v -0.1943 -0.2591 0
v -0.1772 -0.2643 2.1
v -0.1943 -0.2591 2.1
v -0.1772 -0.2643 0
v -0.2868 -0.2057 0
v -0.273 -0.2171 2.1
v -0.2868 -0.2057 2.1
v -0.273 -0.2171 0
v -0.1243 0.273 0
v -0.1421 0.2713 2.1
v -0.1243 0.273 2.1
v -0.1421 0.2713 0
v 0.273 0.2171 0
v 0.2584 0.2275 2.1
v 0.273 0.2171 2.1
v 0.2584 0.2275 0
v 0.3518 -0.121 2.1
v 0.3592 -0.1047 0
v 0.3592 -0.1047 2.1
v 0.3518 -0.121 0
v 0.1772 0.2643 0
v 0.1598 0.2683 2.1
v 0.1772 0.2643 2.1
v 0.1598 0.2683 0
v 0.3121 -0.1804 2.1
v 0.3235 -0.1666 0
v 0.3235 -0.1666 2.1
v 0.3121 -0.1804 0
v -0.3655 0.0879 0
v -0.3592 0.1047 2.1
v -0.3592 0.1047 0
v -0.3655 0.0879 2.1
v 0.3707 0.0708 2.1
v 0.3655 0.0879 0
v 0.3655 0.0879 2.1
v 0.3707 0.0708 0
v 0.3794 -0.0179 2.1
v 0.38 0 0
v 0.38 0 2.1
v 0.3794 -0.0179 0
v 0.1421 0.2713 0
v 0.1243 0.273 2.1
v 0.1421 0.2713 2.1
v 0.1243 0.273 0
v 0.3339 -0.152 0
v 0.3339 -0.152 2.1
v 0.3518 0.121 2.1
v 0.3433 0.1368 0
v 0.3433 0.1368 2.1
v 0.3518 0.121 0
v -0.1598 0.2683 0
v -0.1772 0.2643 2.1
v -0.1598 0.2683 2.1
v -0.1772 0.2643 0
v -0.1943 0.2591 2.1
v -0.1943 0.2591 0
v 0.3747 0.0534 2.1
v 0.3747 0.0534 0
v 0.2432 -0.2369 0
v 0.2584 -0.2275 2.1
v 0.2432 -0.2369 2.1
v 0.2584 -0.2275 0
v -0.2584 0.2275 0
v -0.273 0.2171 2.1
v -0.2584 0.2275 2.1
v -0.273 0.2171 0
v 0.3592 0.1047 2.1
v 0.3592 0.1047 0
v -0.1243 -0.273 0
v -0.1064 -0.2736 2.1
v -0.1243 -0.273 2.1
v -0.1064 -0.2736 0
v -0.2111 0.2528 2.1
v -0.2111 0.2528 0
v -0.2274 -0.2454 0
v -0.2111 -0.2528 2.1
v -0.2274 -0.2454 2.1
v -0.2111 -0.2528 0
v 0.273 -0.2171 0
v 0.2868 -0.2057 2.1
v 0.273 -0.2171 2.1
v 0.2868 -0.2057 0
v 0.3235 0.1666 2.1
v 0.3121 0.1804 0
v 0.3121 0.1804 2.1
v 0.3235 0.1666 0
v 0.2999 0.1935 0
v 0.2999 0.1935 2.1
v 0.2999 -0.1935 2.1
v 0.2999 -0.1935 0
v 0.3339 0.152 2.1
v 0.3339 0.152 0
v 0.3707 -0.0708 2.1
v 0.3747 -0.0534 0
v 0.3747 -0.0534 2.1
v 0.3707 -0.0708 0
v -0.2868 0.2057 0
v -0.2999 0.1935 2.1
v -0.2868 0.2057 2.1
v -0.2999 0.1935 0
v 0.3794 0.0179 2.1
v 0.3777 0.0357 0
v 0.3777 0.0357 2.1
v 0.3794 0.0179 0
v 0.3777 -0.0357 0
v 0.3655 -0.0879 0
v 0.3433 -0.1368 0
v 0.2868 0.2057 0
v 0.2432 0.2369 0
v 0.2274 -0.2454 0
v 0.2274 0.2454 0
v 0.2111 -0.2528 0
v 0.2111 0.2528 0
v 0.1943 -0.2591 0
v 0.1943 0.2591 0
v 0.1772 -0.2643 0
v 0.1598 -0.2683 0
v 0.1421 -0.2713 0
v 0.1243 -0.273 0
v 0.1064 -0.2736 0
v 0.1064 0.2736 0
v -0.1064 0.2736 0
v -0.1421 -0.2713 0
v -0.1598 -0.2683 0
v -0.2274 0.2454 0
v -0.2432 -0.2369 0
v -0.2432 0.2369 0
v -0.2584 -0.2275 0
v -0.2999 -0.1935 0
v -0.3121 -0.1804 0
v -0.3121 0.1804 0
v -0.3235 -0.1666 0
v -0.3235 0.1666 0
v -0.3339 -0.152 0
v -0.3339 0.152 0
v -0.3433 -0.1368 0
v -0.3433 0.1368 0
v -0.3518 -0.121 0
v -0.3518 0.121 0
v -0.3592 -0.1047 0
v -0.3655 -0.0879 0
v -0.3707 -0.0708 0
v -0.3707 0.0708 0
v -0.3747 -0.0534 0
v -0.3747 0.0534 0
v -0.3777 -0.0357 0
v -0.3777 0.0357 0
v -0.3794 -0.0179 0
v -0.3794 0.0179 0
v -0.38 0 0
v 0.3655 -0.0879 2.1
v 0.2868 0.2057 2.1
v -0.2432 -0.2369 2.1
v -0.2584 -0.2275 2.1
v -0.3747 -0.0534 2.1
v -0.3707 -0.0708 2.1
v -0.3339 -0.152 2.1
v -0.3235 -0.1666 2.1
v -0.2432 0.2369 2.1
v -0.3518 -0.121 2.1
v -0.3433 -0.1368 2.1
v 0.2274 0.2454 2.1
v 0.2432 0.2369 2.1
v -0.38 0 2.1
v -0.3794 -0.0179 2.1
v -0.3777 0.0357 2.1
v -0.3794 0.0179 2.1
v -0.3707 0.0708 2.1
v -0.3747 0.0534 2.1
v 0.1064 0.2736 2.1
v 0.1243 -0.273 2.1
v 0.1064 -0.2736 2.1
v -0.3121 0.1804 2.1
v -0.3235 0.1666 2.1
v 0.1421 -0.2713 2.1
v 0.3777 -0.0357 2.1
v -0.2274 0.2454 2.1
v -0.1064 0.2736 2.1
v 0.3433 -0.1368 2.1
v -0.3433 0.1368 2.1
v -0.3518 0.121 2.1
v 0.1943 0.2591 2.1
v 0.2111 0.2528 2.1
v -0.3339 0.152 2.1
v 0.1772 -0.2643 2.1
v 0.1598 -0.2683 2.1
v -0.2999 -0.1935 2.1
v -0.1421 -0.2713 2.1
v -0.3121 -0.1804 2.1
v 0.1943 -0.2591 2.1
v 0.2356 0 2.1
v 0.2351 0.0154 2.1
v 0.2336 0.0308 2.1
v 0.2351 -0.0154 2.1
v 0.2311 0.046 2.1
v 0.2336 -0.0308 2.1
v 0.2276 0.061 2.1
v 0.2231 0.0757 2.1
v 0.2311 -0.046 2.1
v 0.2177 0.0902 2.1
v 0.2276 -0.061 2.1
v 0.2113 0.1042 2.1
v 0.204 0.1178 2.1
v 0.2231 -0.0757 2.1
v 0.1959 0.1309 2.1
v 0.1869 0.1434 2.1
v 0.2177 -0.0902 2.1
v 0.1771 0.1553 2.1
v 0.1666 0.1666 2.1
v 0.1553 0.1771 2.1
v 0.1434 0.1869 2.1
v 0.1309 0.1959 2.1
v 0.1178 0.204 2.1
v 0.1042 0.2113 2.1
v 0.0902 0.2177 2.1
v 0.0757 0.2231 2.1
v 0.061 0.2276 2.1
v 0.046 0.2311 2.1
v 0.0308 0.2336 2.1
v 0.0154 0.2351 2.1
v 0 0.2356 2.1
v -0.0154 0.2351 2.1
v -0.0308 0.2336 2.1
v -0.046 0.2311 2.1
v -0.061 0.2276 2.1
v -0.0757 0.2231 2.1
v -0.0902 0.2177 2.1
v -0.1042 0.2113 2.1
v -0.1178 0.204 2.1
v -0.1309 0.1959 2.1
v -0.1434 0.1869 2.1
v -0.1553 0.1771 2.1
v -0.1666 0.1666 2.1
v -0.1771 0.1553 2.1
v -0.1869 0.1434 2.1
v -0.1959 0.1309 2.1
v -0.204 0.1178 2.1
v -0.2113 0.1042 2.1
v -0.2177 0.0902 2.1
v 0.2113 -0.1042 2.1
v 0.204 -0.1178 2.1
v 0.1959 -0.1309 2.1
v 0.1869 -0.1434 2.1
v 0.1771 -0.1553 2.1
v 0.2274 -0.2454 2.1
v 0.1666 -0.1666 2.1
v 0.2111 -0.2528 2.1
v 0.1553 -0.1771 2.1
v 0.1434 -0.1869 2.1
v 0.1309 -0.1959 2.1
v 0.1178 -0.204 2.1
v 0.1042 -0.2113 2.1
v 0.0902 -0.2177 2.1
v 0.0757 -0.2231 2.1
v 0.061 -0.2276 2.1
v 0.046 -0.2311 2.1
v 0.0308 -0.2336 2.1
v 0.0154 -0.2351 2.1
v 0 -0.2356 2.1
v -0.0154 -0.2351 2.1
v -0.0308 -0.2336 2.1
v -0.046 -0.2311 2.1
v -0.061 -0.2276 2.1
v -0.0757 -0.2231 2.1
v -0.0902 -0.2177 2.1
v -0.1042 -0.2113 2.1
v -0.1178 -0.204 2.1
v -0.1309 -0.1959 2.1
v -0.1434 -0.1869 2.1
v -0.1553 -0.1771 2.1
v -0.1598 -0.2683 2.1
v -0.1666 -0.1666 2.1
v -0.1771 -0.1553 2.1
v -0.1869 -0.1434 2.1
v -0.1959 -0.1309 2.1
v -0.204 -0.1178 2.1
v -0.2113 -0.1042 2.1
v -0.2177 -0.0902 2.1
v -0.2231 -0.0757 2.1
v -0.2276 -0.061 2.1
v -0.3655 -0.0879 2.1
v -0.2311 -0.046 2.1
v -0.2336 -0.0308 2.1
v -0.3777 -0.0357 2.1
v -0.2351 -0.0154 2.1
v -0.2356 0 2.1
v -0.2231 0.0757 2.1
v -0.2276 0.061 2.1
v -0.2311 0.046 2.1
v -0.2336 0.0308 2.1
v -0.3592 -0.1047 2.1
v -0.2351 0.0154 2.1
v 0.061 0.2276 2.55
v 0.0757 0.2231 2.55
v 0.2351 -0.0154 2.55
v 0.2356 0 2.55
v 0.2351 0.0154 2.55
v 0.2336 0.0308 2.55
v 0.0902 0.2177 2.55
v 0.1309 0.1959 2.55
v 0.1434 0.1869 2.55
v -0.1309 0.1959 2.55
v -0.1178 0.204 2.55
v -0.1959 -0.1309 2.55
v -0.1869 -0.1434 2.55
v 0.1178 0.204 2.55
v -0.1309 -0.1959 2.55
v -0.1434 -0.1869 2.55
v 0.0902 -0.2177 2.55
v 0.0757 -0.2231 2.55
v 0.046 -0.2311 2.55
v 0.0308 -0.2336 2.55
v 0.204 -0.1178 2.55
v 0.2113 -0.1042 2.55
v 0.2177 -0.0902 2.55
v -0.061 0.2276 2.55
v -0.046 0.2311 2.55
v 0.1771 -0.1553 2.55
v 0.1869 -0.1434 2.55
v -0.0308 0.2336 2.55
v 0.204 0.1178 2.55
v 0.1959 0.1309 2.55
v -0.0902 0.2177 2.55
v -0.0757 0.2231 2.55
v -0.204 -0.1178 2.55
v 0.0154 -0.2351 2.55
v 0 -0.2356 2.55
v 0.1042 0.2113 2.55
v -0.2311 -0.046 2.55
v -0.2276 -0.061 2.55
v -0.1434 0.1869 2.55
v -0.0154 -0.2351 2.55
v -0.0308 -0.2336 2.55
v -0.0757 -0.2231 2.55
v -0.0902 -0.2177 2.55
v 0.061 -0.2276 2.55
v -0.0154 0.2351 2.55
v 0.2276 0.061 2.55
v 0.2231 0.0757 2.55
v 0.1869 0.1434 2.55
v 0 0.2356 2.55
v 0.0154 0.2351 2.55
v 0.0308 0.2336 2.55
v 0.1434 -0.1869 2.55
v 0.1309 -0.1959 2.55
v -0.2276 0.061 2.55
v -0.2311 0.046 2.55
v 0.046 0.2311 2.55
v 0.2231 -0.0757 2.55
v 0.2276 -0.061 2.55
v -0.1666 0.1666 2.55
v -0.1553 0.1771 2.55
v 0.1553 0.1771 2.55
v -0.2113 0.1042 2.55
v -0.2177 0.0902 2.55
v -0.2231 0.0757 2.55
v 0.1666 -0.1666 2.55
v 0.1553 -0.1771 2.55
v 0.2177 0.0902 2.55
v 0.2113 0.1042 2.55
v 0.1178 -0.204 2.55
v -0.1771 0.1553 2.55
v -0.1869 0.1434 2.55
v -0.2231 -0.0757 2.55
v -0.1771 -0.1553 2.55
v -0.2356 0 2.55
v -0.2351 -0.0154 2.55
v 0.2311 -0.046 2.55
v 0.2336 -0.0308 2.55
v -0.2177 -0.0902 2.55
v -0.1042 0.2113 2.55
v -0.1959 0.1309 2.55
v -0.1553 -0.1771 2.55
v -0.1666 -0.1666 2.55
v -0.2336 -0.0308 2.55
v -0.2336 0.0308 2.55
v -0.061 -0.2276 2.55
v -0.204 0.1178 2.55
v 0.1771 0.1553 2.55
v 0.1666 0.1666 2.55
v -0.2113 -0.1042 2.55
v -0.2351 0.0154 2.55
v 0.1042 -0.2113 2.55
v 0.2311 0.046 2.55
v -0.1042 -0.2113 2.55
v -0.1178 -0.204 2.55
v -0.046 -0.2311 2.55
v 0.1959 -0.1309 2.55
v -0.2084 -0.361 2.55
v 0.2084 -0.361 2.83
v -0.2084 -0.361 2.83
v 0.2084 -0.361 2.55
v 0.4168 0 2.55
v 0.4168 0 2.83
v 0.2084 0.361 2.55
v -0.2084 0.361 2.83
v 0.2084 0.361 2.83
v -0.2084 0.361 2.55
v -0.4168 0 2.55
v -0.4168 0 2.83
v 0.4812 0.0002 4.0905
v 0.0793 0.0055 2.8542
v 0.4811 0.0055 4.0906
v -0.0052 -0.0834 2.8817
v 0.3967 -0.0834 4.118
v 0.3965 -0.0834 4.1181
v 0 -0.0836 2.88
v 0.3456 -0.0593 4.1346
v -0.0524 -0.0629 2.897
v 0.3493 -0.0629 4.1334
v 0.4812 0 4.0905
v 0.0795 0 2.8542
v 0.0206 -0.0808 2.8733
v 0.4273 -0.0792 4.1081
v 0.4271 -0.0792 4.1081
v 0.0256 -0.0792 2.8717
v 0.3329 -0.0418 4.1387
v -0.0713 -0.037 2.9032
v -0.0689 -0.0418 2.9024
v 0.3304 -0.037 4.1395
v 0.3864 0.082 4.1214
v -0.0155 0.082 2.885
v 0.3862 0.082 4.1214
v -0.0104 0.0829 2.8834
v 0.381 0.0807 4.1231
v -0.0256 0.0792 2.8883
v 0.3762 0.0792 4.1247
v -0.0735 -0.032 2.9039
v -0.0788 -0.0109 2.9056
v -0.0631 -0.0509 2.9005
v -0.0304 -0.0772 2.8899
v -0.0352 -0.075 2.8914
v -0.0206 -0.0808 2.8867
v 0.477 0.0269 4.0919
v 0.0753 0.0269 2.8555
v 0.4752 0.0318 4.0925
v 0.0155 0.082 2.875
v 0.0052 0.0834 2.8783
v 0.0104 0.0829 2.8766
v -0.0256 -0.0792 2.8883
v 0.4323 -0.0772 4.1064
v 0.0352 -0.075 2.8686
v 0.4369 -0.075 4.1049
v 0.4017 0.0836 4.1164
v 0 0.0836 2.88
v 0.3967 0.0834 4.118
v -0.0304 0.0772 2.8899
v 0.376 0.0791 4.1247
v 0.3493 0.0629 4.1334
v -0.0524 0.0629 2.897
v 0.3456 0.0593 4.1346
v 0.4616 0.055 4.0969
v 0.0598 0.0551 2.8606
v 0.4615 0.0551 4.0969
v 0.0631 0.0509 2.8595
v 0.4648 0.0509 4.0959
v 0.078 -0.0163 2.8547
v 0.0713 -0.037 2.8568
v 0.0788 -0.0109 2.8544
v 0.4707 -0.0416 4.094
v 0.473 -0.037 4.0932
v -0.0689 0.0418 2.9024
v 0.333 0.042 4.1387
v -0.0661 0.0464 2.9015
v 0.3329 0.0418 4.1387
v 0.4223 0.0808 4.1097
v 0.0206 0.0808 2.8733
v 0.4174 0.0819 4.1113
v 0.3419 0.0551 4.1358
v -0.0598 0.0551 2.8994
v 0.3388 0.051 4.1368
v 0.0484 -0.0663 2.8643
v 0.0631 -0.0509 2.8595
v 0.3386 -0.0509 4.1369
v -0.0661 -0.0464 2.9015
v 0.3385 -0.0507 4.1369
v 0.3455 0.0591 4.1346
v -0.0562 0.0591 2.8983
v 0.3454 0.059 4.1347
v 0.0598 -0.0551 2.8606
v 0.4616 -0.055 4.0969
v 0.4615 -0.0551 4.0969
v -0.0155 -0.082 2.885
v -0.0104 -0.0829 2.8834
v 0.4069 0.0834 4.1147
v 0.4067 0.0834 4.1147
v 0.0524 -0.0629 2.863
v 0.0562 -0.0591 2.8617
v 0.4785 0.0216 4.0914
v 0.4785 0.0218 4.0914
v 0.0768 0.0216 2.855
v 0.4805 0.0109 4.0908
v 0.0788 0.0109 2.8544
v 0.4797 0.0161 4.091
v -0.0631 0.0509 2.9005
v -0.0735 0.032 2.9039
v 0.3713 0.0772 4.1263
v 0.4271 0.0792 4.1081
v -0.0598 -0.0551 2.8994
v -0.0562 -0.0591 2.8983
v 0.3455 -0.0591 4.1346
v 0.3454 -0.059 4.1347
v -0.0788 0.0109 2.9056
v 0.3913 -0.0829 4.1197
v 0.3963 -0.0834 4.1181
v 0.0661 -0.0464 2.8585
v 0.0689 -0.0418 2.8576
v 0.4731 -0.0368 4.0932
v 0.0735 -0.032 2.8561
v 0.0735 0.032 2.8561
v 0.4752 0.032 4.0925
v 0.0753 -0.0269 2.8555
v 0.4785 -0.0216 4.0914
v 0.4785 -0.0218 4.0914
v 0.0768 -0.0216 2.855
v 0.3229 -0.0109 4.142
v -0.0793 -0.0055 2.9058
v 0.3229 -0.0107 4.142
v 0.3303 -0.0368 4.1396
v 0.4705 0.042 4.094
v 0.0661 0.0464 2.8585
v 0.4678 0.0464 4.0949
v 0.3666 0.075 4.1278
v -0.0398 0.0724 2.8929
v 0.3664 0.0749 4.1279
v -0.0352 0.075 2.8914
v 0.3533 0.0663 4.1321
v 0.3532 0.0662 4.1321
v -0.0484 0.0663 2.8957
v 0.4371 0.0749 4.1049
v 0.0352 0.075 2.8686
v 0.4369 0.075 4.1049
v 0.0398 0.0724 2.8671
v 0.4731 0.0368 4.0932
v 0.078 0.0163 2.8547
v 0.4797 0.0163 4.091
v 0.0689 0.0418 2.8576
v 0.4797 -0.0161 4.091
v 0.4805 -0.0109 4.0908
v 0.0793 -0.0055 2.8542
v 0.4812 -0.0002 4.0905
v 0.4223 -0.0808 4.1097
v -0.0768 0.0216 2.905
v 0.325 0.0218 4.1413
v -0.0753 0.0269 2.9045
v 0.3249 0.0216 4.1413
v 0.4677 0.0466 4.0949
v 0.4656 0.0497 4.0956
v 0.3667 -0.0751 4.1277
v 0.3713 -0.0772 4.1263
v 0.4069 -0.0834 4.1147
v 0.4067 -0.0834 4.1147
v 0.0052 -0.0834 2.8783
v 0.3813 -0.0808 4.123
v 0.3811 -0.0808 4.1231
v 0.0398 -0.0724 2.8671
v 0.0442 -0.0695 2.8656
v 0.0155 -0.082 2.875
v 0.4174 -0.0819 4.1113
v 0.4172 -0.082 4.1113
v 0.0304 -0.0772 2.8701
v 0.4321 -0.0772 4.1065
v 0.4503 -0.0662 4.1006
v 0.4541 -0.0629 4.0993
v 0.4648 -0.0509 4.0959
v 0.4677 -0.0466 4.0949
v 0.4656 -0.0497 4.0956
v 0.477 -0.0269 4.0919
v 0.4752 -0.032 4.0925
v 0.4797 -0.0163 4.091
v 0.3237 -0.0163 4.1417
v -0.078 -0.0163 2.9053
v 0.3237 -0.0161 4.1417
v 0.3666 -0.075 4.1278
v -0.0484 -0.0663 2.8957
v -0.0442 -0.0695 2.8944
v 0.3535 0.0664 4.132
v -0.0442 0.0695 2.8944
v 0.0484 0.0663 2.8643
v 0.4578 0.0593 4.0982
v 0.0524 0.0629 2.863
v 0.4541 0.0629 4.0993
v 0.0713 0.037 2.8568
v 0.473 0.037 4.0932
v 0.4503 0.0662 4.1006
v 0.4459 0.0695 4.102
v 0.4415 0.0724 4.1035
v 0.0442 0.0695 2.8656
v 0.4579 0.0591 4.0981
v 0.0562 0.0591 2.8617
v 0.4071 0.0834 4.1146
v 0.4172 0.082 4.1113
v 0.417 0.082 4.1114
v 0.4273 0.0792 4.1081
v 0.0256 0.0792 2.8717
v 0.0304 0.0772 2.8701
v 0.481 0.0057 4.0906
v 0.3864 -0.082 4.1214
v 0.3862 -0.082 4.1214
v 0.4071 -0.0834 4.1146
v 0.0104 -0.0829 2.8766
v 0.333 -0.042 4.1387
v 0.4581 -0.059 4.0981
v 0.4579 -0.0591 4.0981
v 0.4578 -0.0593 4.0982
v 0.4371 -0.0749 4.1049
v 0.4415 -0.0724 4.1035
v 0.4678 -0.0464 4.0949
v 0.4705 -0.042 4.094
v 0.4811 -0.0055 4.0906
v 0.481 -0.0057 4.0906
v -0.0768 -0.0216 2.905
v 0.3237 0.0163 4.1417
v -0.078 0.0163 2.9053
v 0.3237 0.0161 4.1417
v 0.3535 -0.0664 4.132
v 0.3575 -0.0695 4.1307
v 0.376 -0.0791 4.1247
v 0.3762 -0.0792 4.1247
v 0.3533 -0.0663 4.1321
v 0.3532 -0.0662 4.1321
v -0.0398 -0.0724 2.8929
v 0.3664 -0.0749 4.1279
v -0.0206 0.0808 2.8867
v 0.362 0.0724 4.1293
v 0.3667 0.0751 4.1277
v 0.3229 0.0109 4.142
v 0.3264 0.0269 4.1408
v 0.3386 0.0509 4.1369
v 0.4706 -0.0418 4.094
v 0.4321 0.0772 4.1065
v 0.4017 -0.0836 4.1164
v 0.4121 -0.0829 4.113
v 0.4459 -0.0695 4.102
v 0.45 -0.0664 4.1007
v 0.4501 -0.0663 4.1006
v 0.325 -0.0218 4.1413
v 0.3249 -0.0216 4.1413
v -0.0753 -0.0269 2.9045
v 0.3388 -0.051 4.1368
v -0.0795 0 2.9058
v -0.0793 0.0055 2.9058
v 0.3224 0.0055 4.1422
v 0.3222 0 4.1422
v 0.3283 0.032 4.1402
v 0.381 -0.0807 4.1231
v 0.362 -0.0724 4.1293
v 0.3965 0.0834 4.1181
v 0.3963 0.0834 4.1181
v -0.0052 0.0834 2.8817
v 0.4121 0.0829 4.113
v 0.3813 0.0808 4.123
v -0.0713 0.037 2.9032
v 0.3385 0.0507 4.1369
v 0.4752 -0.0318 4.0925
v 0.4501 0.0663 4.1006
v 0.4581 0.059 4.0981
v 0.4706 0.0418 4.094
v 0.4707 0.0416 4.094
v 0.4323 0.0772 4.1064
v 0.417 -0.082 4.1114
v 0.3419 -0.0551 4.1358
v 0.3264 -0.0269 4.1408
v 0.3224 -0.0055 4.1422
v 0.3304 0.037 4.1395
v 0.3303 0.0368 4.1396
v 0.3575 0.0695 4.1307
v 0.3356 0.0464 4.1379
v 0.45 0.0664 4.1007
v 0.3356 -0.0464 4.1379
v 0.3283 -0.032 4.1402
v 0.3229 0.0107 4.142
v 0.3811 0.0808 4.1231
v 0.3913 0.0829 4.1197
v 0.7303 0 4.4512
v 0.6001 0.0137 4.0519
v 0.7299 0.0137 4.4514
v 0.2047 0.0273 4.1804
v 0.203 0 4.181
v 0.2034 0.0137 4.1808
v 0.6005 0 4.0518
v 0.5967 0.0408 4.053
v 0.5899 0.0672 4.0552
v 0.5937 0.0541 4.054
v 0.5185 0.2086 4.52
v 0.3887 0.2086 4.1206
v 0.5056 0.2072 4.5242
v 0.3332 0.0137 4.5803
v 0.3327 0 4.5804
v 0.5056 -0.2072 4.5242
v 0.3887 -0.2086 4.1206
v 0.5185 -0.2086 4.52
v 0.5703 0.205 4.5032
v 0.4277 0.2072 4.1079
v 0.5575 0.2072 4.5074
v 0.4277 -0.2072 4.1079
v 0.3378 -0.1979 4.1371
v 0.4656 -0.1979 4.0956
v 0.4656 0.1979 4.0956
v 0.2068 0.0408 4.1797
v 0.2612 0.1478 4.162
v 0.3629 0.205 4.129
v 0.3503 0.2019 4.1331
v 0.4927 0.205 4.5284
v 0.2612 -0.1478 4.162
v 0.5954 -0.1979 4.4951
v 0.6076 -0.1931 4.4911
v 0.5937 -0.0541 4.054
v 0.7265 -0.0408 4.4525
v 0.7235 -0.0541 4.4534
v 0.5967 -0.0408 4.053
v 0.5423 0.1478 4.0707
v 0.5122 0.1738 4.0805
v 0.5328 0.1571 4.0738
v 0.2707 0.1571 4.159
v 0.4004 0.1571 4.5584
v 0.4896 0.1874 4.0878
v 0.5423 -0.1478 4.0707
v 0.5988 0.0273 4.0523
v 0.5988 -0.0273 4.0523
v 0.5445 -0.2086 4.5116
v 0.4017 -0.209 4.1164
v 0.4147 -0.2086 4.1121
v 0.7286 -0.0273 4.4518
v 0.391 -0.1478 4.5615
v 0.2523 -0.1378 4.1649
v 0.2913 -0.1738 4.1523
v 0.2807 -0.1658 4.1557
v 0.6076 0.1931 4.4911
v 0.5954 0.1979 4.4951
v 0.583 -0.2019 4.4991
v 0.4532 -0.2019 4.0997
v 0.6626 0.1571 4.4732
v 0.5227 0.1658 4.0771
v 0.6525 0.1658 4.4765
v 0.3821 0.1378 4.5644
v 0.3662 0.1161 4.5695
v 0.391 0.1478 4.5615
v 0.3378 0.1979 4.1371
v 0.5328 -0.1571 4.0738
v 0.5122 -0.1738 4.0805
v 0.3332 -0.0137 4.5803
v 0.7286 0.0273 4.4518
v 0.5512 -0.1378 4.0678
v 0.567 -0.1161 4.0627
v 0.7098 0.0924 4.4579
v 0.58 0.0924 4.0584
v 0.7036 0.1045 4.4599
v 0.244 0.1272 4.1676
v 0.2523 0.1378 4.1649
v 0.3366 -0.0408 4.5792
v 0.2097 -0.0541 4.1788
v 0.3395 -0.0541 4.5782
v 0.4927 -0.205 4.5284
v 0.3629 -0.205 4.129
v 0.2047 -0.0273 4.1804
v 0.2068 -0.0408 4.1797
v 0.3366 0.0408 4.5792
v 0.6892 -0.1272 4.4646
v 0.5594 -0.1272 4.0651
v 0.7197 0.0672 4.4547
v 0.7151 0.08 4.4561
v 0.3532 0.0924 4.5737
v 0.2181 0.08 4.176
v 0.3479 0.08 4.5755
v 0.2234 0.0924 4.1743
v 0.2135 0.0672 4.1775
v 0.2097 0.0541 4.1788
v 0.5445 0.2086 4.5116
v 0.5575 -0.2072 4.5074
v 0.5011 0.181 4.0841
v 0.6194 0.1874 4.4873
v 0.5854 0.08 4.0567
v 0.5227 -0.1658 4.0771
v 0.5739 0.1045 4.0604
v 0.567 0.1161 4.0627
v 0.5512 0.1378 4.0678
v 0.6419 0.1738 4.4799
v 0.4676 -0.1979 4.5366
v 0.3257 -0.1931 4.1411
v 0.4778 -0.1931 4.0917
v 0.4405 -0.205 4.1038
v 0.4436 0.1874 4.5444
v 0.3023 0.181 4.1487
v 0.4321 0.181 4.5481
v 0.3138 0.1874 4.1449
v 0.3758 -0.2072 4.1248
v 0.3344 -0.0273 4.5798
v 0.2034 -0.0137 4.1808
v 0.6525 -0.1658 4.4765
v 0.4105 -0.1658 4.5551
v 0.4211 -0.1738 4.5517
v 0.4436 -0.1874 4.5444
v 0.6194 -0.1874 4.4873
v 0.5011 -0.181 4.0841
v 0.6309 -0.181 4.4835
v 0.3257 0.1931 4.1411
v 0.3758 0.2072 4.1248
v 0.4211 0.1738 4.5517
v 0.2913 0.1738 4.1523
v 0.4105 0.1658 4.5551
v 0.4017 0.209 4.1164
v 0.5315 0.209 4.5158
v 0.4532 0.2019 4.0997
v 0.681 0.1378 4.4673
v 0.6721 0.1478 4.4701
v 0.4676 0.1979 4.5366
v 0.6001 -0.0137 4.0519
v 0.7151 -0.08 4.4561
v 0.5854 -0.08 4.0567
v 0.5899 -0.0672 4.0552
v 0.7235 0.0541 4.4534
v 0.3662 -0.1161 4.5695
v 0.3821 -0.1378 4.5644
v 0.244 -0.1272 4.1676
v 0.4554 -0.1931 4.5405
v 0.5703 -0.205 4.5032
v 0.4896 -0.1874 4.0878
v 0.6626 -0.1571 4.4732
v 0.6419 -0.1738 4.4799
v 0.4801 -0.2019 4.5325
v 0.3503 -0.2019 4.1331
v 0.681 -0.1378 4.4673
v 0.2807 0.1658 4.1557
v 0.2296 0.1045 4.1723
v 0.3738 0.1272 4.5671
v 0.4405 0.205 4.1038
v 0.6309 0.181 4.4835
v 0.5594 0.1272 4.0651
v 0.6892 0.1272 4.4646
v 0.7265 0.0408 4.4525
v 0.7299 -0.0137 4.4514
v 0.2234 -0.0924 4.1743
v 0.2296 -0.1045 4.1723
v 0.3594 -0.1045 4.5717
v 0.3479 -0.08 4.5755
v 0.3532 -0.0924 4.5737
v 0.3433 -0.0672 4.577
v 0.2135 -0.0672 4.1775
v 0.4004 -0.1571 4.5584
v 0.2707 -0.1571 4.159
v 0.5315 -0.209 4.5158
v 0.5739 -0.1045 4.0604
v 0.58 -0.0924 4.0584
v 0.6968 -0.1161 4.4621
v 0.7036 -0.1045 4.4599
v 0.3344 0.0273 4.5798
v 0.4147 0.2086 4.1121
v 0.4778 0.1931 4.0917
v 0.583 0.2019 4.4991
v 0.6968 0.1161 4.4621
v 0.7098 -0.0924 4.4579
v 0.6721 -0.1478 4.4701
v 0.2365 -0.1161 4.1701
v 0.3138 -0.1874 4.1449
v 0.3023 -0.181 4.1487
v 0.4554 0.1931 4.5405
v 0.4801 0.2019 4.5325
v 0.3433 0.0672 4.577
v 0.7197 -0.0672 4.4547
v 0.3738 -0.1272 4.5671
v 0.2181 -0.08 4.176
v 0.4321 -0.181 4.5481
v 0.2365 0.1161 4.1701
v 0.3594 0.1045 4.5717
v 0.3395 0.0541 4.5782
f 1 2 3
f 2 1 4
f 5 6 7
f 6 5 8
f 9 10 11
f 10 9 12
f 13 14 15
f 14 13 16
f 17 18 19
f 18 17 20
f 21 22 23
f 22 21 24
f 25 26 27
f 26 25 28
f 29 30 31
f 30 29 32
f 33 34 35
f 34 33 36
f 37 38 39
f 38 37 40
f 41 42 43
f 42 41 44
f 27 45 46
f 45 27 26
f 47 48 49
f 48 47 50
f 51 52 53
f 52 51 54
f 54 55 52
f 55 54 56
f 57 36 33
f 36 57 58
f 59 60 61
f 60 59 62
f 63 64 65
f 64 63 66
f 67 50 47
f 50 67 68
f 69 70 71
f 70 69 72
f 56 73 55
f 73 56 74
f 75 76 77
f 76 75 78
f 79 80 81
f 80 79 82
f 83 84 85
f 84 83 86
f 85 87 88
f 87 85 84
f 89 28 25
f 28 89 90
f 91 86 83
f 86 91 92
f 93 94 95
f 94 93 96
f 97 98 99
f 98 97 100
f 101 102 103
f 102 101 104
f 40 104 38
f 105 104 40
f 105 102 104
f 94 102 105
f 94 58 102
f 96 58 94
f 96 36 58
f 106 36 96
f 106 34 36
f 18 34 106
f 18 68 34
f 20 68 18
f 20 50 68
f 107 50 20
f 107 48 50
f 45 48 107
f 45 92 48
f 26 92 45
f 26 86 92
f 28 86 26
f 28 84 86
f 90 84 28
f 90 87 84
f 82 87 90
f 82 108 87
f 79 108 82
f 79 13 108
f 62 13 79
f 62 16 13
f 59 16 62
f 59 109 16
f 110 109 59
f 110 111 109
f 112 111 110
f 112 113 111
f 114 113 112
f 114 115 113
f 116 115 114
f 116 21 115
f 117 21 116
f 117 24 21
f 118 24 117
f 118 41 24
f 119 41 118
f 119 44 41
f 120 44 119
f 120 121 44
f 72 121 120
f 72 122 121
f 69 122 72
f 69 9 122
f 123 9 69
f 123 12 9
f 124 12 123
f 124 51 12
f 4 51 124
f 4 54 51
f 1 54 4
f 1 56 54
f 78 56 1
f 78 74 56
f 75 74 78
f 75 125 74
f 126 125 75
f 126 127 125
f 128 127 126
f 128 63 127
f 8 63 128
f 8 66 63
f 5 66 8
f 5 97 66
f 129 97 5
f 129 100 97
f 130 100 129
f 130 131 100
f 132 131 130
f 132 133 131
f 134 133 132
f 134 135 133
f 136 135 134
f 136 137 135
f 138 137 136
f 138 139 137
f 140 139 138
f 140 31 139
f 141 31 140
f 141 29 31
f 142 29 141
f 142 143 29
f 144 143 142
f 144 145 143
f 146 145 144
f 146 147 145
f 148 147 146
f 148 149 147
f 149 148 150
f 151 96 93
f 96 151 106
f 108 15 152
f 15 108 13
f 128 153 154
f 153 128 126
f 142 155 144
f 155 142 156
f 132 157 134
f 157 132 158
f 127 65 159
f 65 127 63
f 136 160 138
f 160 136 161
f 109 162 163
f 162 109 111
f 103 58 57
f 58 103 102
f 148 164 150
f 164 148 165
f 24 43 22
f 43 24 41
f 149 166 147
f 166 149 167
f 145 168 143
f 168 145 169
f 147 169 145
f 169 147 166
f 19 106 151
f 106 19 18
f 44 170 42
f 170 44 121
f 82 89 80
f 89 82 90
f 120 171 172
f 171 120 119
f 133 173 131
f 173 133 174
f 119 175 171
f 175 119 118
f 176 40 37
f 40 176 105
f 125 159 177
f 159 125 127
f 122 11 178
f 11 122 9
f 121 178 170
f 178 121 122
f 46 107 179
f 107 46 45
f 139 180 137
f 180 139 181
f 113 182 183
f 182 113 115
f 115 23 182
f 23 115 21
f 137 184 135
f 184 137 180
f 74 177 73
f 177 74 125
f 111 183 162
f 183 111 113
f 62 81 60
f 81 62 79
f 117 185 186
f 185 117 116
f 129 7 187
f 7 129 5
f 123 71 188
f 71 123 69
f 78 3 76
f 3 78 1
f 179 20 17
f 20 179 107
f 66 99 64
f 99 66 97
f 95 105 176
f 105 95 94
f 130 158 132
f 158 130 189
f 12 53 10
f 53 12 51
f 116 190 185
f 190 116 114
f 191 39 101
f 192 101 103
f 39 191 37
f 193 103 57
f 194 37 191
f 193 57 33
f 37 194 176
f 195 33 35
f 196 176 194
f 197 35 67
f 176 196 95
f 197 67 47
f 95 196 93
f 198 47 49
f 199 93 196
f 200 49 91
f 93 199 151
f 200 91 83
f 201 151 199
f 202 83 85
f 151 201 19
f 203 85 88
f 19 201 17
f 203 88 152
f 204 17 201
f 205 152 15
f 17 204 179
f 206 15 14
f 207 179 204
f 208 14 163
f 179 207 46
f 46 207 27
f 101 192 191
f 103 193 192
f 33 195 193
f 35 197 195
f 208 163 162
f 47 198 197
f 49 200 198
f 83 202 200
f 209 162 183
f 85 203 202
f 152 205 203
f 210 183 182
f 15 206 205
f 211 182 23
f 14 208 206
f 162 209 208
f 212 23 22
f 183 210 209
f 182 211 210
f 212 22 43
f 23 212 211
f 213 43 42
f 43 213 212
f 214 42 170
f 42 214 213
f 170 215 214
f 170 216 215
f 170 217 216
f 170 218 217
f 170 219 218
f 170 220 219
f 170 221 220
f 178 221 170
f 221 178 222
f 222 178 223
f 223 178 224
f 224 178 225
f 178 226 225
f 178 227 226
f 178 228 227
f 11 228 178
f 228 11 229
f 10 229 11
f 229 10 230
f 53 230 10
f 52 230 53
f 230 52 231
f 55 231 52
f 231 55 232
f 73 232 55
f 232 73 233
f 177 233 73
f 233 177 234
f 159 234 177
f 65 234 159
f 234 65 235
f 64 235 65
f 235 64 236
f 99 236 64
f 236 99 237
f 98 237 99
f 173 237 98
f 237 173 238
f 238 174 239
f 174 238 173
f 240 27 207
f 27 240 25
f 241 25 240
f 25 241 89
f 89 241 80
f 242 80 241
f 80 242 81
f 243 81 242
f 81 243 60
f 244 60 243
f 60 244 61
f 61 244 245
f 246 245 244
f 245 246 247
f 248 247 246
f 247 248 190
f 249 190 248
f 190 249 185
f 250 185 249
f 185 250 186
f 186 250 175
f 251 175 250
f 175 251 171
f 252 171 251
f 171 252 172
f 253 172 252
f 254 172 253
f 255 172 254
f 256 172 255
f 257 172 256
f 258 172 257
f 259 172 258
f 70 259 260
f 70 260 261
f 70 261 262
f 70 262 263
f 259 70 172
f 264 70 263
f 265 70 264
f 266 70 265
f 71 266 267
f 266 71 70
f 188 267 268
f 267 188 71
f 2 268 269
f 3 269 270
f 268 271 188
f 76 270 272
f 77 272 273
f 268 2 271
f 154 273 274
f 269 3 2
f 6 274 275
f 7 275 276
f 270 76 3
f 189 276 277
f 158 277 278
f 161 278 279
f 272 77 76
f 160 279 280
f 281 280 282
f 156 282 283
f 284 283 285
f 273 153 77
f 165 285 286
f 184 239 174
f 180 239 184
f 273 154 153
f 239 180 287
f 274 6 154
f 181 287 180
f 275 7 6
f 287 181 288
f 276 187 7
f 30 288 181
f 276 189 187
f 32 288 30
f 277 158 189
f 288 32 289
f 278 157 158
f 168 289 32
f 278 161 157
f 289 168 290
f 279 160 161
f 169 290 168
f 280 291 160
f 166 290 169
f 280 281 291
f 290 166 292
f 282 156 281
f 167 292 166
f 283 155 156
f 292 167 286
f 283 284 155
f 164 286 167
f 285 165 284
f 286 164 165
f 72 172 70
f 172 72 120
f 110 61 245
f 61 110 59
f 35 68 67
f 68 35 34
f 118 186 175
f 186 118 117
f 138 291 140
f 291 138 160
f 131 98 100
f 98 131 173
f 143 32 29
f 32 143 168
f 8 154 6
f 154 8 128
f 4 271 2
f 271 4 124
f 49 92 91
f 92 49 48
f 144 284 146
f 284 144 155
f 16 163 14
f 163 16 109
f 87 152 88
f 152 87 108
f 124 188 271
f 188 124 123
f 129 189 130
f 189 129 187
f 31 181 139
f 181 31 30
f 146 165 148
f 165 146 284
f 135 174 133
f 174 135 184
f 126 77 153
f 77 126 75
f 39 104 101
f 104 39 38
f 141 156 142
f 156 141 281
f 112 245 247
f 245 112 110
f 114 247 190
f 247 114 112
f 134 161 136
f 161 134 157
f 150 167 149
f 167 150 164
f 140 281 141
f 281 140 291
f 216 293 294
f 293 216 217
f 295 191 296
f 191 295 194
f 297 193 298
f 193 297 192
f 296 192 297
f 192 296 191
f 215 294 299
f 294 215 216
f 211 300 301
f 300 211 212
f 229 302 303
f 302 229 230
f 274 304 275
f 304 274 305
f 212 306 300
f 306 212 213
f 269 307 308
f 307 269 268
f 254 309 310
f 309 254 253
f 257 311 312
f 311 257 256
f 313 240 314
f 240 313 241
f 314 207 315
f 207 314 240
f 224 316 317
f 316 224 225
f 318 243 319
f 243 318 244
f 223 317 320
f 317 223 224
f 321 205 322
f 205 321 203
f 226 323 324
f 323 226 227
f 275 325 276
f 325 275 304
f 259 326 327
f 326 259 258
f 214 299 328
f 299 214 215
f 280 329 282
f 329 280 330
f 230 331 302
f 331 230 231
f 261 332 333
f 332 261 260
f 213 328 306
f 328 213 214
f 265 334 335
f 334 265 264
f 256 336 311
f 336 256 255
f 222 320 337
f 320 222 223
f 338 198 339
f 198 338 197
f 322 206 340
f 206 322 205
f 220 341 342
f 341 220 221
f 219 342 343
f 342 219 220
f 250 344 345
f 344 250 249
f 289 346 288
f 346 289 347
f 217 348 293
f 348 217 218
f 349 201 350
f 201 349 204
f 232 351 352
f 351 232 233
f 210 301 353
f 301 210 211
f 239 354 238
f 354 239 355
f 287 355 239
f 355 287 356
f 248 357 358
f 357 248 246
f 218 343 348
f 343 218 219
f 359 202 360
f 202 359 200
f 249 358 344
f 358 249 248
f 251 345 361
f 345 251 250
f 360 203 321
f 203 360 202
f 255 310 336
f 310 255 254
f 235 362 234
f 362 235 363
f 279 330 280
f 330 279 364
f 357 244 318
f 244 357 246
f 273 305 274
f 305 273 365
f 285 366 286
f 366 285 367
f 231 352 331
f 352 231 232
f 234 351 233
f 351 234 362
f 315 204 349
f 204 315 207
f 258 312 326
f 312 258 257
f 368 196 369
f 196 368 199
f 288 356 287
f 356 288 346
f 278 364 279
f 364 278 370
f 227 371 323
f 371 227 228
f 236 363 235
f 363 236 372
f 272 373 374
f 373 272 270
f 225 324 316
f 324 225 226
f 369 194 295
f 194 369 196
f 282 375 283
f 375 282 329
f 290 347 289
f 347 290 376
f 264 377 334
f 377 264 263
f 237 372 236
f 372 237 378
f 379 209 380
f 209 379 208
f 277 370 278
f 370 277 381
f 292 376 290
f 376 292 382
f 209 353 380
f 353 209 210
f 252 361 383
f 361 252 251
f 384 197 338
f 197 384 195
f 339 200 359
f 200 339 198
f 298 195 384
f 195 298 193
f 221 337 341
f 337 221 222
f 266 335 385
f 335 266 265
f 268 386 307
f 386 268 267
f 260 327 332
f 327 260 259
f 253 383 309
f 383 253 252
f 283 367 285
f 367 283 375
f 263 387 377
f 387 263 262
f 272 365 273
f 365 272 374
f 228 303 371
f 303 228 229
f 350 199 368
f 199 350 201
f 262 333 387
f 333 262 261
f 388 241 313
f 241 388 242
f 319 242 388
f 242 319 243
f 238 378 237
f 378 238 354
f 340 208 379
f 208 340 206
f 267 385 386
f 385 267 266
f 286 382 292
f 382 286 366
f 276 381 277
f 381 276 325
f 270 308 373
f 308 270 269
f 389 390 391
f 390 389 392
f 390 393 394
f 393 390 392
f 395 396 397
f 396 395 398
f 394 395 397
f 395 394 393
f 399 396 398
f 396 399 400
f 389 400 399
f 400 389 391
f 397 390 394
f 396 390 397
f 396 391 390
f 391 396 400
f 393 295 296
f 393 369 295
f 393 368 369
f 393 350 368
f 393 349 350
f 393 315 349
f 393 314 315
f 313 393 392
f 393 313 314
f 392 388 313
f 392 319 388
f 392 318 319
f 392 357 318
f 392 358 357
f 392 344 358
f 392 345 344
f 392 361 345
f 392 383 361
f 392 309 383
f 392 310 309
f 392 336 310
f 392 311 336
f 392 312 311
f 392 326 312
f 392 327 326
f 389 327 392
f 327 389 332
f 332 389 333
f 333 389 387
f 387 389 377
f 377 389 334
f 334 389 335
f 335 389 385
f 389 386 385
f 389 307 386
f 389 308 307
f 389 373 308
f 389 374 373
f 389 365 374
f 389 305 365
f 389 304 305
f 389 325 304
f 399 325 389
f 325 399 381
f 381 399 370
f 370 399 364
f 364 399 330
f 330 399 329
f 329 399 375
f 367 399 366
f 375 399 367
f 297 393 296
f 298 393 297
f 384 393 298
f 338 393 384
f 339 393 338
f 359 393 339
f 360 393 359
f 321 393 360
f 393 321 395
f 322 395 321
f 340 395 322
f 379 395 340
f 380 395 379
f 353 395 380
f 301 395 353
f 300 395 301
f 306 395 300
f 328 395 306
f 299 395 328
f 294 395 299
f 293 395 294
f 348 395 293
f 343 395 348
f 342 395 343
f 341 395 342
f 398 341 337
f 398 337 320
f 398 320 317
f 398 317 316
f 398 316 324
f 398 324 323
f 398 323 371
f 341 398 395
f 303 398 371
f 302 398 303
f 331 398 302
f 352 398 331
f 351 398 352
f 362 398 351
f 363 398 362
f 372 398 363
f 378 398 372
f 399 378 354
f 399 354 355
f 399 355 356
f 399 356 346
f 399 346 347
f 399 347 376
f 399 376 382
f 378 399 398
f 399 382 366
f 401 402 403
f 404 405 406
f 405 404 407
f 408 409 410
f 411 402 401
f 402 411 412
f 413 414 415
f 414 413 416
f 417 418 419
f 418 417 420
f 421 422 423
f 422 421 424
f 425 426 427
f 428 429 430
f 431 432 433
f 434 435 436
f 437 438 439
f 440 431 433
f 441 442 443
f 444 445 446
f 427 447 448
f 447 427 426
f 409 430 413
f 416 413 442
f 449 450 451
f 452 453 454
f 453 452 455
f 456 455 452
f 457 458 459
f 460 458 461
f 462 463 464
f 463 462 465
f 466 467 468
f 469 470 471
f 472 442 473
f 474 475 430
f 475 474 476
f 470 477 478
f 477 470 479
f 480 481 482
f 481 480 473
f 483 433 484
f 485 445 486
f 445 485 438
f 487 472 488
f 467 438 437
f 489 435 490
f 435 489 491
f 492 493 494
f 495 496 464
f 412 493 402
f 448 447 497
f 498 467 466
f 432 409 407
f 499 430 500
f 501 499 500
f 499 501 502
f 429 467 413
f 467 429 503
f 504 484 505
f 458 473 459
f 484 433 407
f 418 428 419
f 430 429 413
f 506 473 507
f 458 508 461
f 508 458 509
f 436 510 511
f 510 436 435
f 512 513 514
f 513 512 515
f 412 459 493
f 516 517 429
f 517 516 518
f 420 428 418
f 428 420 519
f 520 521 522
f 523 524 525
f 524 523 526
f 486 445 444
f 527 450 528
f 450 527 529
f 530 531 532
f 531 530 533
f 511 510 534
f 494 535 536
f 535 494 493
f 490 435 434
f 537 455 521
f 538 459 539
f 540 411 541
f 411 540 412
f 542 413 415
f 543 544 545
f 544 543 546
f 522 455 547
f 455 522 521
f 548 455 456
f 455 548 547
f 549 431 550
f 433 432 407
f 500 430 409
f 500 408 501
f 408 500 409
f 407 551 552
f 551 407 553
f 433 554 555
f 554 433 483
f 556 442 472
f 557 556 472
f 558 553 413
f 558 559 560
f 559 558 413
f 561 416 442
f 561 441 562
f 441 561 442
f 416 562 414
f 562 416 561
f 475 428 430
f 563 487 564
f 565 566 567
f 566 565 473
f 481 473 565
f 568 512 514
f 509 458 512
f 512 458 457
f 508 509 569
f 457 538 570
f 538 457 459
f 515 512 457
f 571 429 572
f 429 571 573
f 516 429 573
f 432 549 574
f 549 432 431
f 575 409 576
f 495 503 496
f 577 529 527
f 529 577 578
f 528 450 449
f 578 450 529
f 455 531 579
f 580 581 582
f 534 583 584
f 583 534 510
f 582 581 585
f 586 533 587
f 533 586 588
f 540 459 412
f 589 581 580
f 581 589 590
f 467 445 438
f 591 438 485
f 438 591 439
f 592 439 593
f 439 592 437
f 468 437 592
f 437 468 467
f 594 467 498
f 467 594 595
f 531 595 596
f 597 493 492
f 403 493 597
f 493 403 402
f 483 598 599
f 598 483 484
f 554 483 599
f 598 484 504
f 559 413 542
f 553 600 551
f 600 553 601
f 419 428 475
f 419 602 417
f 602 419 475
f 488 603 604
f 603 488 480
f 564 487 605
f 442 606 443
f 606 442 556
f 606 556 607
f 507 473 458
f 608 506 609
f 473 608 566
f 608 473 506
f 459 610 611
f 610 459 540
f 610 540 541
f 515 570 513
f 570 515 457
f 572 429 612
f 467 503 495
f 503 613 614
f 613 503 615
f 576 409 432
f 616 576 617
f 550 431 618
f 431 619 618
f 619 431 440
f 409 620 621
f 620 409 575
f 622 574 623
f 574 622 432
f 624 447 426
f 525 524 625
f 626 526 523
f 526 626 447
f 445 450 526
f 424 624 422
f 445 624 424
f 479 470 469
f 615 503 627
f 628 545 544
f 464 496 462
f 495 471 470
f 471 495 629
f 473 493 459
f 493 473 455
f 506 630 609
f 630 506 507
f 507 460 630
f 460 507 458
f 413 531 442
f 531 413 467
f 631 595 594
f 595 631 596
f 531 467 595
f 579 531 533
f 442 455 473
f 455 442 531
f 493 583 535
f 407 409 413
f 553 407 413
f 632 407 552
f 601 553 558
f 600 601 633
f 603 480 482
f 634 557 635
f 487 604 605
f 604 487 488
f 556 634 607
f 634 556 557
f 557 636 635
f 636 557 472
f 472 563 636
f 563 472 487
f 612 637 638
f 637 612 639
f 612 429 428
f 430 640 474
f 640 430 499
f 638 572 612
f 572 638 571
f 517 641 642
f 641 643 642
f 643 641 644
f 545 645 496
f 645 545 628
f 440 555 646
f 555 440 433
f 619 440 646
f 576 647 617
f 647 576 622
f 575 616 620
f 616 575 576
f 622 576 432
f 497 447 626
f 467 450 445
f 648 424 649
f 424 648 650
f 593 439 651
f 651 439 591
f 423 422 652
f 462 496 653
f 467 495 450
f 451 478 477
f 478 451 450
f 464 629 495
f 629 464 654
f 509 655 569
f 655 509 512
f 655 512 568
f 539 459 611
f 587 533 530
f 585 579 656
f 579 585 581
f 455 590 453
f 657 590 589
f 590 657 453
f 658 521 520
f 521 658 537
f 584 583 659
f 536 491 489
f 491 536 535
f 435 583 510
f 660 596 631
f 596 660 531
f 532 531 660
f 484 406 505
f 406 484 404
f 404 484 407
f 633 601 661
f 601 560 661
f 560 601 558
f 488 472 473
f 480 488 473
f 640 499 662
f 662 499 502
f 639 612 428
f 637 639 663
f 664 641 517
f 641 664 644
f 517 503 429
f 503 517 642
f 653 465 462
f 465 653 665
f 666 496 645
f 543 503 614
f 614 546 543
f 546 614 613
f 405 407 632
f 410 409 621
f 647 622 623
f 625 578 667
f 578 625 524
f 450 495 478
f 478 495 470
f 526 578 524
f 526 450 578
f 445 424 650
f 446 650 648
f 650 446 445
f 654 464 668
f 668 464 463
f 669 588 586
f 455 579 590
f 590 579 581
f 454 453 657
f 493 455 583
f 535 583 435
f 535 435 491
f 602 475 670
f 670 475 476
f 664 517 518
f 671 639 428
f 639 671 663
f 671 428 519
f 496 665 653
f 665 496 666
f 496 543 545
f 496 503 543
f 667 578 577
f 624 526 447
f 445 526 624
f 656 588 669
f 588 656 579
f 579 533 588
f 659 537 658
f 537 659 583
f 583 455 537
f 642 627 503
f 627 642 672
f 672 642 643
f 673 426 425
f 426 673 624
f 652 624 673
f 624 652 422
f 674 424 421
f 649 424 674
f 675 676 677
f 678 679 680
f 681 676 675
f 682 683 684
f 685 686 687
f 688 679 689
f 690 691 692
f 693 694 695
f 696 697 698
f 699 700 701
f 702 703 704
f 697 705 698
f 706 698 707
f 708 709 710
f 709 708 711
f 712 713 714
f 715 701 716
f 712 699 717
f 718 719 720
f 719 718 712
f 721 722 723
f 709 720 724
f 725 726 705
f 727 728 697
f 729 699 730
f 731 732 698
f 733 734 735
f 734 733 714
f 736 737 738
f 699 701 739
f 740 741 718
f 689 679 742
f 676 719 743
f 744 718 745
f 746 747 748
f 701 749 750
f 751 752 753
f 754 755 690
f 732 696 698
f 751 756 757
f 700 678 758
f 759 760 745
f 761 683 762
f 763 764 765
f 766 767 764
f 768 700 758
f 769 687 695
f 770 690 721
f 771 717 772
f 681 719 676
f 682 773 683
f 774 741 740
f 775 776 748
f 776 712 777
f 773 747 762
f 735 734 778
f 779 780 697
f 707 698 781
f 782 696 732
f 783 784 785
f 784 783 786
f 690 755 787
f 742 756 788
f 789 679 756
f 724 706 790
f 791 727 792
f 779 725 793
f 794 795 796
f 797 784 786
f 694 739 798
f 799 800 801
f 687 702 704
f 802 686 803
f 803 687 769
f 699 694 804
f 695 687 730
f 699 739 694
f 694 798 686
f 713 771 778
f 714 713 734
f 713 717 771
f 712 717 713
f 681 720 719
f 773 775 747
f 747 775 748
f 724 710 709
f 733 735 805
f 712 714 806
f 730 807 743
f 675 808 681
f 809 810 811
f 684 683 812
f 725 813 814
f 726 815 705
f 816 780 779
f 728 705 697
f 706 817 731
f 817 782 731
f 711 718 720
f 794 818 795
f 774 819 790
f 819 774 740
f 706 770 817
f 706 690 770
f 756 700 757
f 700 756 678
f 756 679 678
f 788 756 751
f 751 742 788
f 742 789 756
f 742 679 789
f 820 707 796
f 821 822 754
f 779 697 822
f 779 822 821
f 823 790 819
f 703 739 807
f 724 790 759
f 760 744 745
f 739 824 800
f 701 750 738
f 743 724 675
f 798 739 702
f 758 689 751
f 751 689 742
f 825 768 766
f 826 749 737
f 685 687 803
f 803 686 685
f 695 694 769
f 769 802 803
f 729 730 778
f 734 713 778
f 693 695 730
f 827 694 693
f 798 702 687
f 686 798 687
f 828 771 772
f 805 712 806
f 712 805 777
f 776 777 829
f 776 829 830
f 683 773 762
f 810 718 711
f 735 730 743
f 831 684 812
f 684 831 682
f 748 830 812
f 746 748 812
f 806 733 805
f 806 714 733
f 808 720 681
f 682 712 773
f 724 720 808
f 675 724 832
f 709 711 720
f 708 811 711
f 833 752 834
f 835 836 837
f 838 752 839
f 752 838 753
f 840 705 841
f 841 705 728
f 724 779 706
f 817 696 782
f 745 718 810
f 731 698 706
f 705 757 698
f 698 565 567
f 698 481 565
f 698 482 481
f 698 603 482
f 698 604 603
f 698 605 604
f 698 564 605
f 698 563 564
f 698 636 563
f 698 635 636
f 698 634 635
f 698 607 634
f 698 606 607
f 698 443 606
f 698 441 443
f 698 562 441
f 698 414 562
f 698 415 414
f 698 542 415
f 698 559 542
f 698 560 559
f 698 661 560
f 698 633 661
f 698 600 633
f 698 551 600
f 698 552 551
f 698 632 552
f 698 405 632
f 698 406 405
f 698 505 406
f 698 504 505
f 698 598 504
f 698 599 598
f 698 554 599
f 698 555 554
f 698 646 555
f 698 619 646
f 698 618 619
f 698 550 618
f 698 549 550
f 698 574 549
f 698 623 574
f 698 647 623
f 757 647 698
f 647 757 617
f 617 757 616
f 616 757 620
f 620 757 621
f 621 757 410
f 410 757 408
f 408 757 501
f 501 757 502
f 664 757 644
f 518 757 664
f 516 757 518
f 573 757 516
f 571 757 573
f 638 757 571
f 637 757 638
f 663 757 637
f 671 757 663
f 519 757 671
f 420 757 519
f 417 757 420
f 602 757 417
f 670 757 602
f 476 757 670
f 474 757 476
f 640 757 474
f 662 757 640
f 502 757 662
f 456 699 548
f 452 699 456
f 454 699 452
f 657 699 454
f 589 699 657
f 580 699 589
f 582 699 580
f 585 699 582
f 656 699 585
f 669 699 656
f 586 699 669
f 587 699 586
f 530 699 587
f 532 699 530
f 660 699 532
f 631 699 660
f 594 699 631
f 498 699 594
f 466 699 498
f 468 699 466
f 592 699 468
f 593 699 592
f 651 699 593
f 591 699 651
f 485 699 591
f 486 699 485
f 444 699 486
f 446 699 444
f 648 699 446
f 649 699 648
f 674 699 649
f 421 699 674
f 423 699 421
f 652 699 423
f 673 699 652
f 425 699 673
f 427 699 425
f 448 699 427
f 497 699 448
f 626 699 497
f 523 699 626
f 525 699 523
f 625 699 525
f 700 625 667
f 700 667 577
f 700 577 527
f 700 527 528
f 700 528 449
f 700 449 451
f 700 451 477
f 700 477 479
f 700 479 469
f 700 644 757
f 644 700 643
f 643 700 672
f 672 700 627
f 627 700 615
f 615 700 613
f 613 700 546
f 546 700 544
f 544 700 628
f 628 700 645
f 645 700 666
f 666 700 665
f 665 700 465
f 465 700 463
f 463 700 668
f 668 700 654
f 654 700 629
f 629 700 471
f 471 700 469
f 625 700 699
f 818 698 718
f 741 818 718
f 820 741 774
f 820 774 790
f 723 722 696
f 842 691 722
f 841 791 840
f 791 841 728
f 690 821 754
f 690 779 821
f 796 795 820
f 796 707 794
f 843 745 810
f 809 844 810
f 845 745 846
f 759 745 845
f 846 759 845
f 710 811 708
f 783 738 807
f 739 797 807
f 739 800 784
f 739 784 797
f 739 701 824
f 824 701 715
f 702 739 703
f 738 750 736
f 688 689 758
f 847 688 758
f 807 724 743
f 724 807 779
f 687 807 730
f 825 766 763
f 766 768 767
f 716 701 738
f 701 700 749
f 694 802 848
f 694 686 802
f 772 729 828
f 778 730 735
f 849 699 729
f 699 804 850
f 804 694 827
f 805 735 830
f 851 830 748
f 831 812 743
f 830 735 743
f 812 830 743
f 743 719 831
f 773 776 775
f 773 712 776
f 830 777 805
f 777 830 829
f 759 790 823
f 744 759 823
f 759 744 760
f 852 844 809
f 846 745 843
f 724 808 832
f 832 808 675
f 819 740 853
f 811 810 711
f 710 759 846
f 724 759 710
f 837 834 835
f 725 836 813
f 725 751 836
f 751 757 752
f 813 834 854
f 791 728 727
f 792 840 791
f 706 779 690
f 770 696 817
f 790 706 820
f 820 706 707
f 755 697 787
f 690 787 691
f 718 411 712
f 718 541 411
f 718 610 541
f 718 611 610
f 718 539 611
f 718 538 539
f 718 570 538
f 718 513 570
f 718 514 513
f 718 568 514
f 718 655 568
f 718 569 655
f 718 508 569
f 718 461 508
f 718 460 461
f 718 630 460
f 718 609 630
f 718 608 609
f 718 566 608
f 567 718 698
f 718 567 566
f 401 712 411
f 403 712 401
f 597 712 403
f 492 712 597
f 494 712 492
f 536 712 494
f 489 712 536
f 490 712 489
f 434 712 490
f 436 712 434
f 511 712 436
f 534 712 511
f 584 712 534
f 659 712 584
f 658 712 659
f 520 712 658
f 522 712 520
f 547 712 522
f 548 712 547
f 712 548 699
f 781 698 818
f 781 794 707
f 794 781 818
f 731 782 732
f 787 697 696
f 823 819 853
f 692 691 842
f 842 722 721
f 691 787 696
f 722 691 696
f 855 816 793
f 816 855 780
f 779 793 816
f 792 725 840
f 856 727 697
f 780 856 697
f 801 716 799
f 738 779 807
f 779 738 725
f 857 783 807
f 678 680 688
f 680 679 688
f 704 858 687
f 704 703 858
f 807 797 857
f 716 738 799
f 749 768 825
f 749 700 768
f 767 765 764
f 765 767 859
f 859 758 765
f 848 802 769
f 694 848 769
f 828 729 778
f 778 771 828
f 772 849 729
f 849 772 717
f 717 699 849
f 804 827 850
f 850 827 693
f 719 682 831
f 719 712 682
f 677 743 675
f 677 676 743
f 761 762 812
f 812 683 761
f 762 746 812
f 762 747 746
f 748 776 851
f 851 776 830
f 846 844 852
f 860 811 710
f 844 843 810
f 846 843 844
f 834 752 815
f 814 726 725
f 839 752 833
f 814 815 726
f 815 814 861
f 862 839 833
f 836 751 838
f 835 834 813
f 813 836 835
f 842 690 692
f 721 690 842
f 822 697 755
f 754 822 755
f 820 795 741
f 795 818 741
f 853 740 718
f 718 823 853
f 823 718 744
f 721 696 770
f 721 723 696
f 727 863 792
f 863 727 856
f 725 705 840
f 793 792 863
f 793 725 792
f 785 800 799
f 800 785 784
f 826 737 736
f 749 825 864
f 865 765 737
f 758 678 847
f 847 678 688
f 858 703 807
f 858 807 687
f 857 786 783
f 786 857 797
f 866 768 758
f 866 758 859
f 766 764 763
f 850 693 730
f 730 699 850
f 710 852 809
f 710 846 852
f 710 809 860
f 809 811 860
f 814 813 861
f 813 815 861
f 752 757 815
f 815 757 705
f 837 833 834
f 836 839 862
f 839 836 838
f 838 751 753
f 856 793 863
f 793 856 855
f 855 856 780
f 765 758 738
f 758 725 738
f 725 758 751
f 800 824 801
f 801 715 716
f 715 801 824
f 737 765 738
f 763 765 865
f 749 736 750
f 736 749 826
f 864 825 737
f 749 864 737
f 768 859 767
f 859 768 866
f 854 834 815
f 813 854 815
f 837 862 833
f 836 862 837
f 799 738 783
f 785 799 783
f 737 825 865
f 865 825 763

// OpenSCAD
// Toggle switch (connected solid), body Ø0.76mm, overall height 4.7mm
// Improved silhouette: rectangular switch body + threaded bushing + hex nut + tilted lever + knob
// All translate() values are derived from dimensions; one connected solid.

$fn = 96;

// Requested key dimensions
body_diameter_mm  = 0.76;  // used as the main body width (across X)
overall_height_mm = 4.7;   // total Z height from bottom of body to top of knob

// Shape controls (kept small to match micro scale)
connection_overlap_mm = 0.05; //[0.02:0.2:0.01]

// Switch body (rectangular to be recognizable in ortho views)
body_w_mm = body_diameter_mm;     // X width matches requested "body diameter"
body_d_mm = body_diameter_mm*0.72; // Y depth (slightly thinner than width)
body_h_mm = 2.10;                 // Z height of main body

// Top bushing (threaded collar look)
bushing_d_mm = body_diameter_mm*0.62;
bushing_h_mm = 0.55;

// Hex nut (gives recognizable toggle hardware)
nut_flat_d_mm = body_diameter_mm*0.95; // across flats
nut_h_mm      = 0.28;

// Lever + knob
lever_d_mm  = body_diameter_mm*0.22;
lever_h_mm  = 1.35;
lever_tilt_deg = 18;

knob_d_mm = body_diameter_mm*0.55;
knob_h_mm = 0.42;

// Derived: ensure exact overall height by adjusting body height if needed
stack_top_mm = bushing_h_mm + nut_h_mm + lever_h_mm + knob_h_mm;
body_h_mm_adj = max(0.6, overall_height_mm - stack_top_mm);

// Helpers
module hex_prism(flat_d, h, center=true) {
  // Regular hex: across flats = 2*apothem => R = flat_d / sqrt(3)
  R = flat_d / sqrt(3);
  cylinder(h=h, r=R, $fn=6, center=center);
}

module toggle() {
  overlap = connection_overlap_mm;

  // Z references (bottom of body at z=0)
  z_body_top    = body_h_mm_adj;
  z_bush_top    = z_body_top + bushing_h_mm;
  z_nut_top     = z_bush_top + nut_h_mm;
  z_lever_base  = z_nut_top - overlap; // lever starts slightly into nut for connectivity

  union() {
    // Main switch body (rectangular with slight rounding)
    // Use hull of two thin cylinders to round edges while keeping rectangular silhouette.
    hull() {
      translate([ body_w_mm/2 - body_d_mm/2, 0, body_h_mm_adj/2])
        cylinder(d=body_d_mm, h=body_h_mm_adj, center=true);
      translate([-body_w_mm/2 + body_d_mm/2, 0, body_h_mm_adj/2])
        cylinder(d=body_d_mm, h=body_h_mm_adj, center=true);
    }

    // Top bushing (cylindrical collar) connected to body
    translate([0, 0, z_body_top + bushing_h_mm/2 - overlap])
      cylinder(d=bushing_d_mm, h=bushing_h_mm, center=true);

    // Hex nut connected to bushing
    translate([0, 0, z_bush_top + nut_h_mm/2 - 2*overlap])
      hex_prism(nut_flat_d_mm, nut_h_mm, center=true);

    // Lever (tilted) connected into nut
    // Place lever so its base intersects the nut by overlap.
    translate([0, 0, z_lever_base])
      rotate([0, lever_tilt_deg, 0])
        translate([0, 0, lever_h_mm/2])
          cylinder(d=lever_d_mm, h=lever_h_mm, center=true);

    // Knob at lever tip (also tilted with lever), connected by overlap
    translate([0, 0, z_lever_base])
      rotate([0, lever_tilt_deg, 0])
        translate([0, 0, lever_h_mm - overlap + knob_h_mm/2])
          cylinder(d=knob_d_mm, h=knob_h_mm, center=true);
  }
}

toggle();
